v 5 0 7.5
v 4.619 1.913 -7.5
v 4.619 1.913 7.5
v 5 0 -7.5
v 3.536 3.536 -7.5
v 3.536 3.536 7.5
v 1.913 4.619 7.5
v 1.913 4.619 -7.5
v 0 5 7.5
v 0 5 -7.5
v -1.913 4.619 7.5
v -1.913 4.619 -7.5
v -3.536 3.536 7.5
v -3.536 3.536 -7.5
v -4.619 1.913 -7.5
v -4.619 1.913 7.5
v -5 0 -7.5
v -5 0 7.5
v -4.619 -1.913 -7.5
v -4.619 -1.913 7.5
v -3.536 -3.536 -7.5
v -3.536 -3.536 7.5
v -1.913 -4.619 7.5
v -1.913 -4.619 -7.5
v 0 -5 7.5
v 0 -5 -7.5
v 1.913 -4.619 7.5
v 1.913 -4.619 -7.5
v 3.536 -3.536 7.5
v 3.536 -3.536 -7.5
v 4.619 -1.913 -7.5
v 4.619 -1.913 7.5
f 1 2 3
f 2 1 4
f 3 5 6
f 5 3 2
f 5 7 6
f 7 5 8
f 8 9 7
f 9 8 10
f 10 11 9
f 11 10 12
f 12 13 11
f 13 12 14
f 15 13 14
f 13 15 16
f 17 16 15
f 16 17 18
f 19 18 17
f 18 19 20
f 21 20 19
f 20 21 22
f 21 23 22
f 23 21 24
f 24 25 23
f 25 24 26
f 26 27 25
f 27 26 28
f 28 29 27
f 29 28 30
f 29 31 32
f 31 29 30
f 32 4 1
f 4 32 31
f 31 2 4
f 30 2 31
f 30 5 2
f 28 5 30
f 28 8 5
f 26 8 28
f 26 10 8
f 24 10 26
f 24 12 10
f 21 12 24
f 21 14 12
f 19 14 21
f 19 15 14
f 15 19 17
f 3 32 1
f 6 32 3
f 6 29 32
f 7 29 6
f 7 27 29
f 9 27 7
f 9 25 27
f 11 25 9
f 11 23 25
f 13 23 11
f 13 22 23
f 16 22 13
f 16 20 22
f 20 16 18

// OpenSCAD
// Variable names can be abbreviated!

// The diameter of the Cylinder
dia = 10;

// The height of the Cylinder
hei = 15;

// Create the Cylinder
// We use 'dia' as diameter, 'hei' as height
cylinder(d = dia, h = hei, center = true);
